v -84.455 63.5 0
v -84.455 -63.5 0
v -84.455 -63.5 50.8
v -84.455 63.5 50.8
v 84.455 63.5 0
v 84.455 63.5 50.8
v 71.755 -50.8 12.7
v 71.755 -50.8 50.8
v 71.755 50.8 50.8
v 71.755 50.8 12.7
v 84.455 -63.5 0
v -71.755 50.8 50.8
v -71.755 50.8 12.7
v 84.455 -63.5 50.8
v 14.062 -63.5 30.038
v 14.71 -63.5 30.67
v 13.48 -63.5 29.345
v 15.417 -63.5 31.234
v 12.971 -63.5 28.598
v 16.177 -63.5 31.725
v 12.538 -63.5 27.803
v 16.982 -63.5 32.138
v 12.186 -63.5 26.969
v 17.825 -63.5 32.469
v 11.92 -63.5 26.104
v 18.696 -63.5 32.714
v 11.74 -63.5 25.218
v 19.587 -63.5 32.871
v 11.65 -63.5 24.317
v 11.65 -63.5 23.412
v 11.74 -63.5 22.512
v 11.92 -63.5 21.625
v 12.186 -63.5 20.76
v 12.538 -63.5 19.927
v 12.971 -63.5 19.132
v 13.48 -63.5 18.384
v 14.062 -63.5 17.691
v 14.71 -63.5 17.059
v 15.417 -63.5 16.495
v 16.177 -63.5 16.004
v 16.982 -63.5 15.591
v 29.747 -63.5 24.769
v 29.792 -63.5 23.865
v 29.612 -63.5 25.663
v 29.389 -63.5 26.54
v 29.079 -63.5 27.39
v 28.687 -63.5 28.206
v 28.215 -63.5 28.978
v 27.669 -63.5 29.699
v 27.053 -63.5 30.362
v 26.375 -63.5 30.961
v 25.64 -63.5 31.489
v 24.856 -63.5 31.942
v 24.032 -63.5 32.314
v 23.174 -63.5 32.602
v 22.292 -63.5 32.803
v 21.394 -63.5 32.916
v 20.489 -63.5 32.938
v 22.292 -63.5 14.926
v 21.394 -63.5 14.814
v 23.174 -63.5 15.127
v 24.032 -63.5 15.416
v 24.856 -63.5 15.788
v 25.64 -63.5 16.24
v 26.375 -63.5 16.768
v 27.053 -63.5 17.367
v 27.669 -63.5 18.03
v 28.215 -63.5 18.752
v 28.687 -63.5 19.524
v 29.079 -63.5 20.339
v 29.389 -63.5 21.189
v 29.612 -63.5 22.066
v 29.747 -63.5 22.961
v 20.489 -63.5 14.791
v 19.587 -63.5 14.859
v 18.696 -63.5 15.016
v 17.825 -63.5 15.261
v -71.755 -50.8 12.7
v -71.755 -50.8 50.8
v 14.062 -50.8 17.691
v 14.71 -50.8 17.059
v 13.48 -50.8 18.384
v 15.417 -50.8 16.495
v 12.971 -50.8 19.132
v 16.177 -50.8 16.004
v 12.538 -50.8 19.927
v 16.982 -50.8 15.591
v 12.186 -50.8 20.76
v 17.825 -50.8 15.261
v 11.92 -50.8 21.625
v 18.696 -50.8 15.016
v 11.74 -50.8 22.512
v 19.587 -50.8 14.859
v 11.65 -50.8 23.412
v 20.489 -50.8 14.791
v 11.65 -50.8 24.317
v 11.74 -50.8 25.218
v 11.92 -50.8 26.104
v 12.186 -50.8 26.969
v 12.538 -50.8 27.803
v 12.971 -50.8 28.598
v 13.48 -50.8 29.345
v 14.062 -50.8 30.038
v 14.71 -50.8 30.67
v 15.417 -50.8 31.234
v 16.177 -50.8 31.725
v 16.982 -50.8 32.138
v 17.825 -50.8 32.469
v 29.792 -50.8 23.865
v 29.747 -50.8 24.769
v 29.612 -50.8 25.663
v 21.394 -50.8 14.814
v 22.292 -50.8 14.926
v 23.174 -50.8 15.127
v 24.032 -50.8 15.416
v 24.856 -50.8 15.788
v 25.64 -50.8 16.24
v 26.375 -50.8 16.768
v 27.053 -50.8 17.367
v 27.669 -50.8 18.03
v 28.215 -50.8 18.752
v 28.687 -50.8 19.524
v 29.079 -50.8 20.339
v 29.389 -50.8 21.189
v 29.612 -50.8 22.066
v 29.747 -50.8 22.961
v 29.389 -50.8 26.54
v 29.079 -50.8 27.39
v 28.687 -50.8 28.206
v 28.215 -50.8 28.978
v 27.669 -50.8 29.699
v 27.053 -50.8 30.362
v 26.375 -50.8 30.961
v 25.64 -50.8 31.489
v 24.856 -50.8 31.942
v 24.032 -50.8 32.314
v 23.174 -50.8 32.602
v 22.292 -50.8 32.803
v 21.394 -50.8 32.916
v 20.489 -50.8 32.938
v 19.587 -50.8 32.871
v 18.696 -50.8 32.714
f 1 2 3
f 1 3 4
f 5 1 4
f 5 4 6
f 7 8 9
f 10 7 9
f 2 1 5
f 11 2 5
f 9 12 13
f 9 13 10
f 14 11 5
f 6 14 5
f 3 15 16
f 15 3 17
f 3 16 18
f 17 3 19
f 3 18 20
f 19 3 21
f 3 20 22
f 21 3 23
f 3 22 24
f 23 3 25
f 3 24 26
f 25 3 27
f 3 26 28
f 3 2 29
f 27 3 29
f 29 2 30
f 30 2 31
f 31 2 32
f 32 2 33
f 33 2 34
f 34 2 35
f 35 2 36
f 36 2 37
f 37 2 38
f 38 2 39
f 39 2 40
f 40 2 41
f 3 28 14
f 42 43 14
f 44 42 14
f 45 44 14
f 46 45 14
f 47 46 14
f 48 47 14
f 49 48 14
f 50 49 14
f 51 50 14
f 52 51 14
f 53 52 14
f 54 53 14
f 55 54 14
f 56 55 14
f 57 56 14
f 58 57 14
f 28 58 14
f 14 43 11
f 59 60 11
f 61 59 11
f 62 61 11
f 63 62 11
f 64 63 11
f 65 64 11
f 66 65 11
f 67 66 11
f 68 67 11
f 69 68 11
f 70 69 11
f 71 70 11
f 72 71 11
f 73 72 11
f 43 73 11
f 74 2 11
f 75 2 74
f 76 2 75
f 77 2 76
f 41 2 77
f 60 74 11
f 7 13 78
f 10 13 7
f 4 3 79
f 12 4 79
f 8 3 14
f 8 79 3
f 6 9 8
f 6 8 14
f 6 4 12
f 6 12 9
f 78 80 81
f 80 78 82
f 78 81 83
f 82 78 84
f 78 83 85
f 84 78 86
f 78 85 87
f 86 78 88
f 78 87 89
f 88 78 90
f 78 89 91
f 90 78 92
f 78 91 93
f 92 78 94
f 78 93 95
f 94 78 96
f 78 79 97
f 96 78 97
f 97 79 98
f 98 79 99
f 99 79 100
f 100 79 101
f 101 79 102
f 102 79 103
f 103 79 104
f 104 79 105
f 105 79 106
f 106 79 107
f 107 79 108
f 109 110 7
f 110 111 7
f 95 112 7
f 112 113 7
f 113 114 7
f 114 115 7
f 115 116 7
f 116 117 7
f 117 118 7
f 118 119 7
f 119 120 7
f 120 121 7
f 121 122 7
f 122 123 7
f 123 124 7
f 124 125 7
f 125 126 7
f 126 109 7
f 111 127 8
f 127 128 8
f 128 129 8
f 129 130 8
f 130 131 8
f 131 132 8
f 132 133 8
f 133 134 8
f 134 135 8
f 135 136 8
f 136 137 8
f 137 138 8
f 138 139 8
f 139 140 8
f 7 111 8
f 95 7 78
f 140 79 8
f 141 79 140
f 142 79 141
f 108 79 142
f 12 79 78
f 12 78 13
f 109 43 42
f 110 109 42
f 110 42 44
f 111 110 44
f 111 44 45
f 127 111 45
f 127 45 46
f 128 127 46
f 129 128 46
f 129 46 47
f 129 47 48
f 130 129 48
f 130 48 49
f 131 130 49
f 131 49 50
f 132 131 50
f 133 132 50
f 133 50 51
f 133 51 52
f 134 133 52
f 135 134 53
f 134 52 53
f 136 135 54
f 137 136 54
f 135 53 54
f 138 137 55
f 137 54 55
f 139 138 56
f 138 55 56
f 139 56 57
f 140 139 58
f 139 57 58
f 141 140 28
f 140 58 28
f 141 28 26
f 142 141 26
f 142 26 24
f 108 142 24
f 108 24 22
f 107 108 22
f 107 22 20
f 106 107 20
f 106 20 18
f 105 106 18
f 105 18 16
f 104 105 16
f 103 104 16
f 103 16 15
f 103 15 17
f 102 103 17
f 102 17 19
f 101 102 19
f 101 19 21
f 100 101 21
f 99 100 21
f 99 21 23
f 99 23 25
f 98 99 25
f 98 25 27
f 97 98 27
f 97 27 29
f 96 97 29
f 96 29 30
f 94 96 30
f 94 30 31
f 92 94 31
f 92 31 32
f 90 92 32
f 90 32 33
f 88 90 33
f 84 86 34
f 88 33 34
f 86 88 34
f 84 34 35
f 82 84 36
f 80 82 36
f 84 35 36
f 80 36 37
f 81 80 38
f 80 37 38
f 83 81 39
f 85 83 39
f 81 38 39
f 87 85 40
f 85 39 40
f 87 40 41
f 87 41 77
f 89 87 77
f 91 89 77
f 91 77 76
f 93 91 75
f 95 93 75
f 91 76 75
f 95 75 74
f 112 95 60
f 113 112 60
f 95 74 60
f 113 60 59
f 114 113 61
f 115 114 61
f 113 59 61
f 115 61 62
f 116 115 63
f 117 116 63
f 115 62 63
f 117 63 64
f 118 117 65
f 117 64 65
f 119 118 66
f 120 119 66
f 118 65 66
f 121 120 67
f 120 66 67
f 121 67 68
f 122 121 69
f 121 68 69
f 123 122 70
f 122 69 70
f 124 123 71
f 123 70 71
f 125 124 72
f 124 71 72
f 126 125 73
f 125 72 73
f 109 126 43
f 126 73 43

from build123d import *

# Parameters (mm, degrees)
F0_W     = 168.91
F0_H     = 127
F1_DEPTH = 50.8
F2_W     = 143.51
F2_H     = 101.6
F3_DEPTH = 38.1
F4_R     = 9.076536
F5_DEPTH = 25.4


with BuildPart() as f1:
    # F0 (on Top) → F1 (new body)
    with BuildSketch(Plane.XY):
        Rectangle(F0_W, F0_H)
    extrude(amount=F1_DEPTH)

    # F2 (on face) → F3 (cut)
    with BuildSketch(Plane.XY.offset(50.8)):
        Rectangle(F2_W, F2_H)
    extrude(amount=-F3_DEPTH, mode=Mode.SUBTRACT)

    # F4 (on face) → F5 (cut)
    with BuildSketch(Plane.XZ.offset(63.5)):
        with Locations((20.715535, 23.864772)):
            Circle(F4_R)
    extrude(amount=-F5_DEPTH, mode=Mode.SUBTRACT)


solid = f1.part
